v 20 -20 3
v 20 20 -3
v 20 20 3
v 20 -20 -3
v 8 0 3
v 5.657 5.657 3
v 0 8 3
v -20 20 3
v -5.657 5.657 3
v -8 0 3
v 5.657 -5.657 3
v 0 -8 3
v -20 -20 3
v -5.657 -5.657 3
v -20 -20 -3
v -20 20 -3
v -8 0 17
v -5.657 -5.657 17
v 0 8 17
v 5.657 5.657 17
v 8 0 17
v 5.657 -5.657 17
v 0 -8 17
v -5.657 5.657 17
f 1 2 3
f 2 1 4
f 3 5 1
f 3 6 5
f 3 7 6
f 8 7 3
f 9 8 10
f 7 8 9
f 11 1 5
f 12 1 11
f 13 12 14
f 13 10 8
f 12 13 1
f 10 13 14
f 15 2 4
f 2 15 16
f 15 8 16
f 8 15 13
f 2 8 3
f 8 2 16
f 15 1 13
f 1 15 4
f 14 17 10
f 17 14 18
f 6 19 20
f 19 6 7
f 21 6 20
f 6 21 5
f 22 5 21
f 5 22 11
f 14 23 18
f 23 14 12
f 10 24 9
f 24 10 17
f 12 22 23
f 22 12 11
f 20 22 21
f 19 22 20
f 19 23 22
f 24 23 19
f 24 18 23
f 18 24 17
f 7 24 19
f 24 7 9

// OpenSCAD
FNSET = 8; $fn = FNSET;
union() { cube([40, 40, 6], center = true); translate([0, 0, 3]) cylinder(d = 16, h = 14); }
